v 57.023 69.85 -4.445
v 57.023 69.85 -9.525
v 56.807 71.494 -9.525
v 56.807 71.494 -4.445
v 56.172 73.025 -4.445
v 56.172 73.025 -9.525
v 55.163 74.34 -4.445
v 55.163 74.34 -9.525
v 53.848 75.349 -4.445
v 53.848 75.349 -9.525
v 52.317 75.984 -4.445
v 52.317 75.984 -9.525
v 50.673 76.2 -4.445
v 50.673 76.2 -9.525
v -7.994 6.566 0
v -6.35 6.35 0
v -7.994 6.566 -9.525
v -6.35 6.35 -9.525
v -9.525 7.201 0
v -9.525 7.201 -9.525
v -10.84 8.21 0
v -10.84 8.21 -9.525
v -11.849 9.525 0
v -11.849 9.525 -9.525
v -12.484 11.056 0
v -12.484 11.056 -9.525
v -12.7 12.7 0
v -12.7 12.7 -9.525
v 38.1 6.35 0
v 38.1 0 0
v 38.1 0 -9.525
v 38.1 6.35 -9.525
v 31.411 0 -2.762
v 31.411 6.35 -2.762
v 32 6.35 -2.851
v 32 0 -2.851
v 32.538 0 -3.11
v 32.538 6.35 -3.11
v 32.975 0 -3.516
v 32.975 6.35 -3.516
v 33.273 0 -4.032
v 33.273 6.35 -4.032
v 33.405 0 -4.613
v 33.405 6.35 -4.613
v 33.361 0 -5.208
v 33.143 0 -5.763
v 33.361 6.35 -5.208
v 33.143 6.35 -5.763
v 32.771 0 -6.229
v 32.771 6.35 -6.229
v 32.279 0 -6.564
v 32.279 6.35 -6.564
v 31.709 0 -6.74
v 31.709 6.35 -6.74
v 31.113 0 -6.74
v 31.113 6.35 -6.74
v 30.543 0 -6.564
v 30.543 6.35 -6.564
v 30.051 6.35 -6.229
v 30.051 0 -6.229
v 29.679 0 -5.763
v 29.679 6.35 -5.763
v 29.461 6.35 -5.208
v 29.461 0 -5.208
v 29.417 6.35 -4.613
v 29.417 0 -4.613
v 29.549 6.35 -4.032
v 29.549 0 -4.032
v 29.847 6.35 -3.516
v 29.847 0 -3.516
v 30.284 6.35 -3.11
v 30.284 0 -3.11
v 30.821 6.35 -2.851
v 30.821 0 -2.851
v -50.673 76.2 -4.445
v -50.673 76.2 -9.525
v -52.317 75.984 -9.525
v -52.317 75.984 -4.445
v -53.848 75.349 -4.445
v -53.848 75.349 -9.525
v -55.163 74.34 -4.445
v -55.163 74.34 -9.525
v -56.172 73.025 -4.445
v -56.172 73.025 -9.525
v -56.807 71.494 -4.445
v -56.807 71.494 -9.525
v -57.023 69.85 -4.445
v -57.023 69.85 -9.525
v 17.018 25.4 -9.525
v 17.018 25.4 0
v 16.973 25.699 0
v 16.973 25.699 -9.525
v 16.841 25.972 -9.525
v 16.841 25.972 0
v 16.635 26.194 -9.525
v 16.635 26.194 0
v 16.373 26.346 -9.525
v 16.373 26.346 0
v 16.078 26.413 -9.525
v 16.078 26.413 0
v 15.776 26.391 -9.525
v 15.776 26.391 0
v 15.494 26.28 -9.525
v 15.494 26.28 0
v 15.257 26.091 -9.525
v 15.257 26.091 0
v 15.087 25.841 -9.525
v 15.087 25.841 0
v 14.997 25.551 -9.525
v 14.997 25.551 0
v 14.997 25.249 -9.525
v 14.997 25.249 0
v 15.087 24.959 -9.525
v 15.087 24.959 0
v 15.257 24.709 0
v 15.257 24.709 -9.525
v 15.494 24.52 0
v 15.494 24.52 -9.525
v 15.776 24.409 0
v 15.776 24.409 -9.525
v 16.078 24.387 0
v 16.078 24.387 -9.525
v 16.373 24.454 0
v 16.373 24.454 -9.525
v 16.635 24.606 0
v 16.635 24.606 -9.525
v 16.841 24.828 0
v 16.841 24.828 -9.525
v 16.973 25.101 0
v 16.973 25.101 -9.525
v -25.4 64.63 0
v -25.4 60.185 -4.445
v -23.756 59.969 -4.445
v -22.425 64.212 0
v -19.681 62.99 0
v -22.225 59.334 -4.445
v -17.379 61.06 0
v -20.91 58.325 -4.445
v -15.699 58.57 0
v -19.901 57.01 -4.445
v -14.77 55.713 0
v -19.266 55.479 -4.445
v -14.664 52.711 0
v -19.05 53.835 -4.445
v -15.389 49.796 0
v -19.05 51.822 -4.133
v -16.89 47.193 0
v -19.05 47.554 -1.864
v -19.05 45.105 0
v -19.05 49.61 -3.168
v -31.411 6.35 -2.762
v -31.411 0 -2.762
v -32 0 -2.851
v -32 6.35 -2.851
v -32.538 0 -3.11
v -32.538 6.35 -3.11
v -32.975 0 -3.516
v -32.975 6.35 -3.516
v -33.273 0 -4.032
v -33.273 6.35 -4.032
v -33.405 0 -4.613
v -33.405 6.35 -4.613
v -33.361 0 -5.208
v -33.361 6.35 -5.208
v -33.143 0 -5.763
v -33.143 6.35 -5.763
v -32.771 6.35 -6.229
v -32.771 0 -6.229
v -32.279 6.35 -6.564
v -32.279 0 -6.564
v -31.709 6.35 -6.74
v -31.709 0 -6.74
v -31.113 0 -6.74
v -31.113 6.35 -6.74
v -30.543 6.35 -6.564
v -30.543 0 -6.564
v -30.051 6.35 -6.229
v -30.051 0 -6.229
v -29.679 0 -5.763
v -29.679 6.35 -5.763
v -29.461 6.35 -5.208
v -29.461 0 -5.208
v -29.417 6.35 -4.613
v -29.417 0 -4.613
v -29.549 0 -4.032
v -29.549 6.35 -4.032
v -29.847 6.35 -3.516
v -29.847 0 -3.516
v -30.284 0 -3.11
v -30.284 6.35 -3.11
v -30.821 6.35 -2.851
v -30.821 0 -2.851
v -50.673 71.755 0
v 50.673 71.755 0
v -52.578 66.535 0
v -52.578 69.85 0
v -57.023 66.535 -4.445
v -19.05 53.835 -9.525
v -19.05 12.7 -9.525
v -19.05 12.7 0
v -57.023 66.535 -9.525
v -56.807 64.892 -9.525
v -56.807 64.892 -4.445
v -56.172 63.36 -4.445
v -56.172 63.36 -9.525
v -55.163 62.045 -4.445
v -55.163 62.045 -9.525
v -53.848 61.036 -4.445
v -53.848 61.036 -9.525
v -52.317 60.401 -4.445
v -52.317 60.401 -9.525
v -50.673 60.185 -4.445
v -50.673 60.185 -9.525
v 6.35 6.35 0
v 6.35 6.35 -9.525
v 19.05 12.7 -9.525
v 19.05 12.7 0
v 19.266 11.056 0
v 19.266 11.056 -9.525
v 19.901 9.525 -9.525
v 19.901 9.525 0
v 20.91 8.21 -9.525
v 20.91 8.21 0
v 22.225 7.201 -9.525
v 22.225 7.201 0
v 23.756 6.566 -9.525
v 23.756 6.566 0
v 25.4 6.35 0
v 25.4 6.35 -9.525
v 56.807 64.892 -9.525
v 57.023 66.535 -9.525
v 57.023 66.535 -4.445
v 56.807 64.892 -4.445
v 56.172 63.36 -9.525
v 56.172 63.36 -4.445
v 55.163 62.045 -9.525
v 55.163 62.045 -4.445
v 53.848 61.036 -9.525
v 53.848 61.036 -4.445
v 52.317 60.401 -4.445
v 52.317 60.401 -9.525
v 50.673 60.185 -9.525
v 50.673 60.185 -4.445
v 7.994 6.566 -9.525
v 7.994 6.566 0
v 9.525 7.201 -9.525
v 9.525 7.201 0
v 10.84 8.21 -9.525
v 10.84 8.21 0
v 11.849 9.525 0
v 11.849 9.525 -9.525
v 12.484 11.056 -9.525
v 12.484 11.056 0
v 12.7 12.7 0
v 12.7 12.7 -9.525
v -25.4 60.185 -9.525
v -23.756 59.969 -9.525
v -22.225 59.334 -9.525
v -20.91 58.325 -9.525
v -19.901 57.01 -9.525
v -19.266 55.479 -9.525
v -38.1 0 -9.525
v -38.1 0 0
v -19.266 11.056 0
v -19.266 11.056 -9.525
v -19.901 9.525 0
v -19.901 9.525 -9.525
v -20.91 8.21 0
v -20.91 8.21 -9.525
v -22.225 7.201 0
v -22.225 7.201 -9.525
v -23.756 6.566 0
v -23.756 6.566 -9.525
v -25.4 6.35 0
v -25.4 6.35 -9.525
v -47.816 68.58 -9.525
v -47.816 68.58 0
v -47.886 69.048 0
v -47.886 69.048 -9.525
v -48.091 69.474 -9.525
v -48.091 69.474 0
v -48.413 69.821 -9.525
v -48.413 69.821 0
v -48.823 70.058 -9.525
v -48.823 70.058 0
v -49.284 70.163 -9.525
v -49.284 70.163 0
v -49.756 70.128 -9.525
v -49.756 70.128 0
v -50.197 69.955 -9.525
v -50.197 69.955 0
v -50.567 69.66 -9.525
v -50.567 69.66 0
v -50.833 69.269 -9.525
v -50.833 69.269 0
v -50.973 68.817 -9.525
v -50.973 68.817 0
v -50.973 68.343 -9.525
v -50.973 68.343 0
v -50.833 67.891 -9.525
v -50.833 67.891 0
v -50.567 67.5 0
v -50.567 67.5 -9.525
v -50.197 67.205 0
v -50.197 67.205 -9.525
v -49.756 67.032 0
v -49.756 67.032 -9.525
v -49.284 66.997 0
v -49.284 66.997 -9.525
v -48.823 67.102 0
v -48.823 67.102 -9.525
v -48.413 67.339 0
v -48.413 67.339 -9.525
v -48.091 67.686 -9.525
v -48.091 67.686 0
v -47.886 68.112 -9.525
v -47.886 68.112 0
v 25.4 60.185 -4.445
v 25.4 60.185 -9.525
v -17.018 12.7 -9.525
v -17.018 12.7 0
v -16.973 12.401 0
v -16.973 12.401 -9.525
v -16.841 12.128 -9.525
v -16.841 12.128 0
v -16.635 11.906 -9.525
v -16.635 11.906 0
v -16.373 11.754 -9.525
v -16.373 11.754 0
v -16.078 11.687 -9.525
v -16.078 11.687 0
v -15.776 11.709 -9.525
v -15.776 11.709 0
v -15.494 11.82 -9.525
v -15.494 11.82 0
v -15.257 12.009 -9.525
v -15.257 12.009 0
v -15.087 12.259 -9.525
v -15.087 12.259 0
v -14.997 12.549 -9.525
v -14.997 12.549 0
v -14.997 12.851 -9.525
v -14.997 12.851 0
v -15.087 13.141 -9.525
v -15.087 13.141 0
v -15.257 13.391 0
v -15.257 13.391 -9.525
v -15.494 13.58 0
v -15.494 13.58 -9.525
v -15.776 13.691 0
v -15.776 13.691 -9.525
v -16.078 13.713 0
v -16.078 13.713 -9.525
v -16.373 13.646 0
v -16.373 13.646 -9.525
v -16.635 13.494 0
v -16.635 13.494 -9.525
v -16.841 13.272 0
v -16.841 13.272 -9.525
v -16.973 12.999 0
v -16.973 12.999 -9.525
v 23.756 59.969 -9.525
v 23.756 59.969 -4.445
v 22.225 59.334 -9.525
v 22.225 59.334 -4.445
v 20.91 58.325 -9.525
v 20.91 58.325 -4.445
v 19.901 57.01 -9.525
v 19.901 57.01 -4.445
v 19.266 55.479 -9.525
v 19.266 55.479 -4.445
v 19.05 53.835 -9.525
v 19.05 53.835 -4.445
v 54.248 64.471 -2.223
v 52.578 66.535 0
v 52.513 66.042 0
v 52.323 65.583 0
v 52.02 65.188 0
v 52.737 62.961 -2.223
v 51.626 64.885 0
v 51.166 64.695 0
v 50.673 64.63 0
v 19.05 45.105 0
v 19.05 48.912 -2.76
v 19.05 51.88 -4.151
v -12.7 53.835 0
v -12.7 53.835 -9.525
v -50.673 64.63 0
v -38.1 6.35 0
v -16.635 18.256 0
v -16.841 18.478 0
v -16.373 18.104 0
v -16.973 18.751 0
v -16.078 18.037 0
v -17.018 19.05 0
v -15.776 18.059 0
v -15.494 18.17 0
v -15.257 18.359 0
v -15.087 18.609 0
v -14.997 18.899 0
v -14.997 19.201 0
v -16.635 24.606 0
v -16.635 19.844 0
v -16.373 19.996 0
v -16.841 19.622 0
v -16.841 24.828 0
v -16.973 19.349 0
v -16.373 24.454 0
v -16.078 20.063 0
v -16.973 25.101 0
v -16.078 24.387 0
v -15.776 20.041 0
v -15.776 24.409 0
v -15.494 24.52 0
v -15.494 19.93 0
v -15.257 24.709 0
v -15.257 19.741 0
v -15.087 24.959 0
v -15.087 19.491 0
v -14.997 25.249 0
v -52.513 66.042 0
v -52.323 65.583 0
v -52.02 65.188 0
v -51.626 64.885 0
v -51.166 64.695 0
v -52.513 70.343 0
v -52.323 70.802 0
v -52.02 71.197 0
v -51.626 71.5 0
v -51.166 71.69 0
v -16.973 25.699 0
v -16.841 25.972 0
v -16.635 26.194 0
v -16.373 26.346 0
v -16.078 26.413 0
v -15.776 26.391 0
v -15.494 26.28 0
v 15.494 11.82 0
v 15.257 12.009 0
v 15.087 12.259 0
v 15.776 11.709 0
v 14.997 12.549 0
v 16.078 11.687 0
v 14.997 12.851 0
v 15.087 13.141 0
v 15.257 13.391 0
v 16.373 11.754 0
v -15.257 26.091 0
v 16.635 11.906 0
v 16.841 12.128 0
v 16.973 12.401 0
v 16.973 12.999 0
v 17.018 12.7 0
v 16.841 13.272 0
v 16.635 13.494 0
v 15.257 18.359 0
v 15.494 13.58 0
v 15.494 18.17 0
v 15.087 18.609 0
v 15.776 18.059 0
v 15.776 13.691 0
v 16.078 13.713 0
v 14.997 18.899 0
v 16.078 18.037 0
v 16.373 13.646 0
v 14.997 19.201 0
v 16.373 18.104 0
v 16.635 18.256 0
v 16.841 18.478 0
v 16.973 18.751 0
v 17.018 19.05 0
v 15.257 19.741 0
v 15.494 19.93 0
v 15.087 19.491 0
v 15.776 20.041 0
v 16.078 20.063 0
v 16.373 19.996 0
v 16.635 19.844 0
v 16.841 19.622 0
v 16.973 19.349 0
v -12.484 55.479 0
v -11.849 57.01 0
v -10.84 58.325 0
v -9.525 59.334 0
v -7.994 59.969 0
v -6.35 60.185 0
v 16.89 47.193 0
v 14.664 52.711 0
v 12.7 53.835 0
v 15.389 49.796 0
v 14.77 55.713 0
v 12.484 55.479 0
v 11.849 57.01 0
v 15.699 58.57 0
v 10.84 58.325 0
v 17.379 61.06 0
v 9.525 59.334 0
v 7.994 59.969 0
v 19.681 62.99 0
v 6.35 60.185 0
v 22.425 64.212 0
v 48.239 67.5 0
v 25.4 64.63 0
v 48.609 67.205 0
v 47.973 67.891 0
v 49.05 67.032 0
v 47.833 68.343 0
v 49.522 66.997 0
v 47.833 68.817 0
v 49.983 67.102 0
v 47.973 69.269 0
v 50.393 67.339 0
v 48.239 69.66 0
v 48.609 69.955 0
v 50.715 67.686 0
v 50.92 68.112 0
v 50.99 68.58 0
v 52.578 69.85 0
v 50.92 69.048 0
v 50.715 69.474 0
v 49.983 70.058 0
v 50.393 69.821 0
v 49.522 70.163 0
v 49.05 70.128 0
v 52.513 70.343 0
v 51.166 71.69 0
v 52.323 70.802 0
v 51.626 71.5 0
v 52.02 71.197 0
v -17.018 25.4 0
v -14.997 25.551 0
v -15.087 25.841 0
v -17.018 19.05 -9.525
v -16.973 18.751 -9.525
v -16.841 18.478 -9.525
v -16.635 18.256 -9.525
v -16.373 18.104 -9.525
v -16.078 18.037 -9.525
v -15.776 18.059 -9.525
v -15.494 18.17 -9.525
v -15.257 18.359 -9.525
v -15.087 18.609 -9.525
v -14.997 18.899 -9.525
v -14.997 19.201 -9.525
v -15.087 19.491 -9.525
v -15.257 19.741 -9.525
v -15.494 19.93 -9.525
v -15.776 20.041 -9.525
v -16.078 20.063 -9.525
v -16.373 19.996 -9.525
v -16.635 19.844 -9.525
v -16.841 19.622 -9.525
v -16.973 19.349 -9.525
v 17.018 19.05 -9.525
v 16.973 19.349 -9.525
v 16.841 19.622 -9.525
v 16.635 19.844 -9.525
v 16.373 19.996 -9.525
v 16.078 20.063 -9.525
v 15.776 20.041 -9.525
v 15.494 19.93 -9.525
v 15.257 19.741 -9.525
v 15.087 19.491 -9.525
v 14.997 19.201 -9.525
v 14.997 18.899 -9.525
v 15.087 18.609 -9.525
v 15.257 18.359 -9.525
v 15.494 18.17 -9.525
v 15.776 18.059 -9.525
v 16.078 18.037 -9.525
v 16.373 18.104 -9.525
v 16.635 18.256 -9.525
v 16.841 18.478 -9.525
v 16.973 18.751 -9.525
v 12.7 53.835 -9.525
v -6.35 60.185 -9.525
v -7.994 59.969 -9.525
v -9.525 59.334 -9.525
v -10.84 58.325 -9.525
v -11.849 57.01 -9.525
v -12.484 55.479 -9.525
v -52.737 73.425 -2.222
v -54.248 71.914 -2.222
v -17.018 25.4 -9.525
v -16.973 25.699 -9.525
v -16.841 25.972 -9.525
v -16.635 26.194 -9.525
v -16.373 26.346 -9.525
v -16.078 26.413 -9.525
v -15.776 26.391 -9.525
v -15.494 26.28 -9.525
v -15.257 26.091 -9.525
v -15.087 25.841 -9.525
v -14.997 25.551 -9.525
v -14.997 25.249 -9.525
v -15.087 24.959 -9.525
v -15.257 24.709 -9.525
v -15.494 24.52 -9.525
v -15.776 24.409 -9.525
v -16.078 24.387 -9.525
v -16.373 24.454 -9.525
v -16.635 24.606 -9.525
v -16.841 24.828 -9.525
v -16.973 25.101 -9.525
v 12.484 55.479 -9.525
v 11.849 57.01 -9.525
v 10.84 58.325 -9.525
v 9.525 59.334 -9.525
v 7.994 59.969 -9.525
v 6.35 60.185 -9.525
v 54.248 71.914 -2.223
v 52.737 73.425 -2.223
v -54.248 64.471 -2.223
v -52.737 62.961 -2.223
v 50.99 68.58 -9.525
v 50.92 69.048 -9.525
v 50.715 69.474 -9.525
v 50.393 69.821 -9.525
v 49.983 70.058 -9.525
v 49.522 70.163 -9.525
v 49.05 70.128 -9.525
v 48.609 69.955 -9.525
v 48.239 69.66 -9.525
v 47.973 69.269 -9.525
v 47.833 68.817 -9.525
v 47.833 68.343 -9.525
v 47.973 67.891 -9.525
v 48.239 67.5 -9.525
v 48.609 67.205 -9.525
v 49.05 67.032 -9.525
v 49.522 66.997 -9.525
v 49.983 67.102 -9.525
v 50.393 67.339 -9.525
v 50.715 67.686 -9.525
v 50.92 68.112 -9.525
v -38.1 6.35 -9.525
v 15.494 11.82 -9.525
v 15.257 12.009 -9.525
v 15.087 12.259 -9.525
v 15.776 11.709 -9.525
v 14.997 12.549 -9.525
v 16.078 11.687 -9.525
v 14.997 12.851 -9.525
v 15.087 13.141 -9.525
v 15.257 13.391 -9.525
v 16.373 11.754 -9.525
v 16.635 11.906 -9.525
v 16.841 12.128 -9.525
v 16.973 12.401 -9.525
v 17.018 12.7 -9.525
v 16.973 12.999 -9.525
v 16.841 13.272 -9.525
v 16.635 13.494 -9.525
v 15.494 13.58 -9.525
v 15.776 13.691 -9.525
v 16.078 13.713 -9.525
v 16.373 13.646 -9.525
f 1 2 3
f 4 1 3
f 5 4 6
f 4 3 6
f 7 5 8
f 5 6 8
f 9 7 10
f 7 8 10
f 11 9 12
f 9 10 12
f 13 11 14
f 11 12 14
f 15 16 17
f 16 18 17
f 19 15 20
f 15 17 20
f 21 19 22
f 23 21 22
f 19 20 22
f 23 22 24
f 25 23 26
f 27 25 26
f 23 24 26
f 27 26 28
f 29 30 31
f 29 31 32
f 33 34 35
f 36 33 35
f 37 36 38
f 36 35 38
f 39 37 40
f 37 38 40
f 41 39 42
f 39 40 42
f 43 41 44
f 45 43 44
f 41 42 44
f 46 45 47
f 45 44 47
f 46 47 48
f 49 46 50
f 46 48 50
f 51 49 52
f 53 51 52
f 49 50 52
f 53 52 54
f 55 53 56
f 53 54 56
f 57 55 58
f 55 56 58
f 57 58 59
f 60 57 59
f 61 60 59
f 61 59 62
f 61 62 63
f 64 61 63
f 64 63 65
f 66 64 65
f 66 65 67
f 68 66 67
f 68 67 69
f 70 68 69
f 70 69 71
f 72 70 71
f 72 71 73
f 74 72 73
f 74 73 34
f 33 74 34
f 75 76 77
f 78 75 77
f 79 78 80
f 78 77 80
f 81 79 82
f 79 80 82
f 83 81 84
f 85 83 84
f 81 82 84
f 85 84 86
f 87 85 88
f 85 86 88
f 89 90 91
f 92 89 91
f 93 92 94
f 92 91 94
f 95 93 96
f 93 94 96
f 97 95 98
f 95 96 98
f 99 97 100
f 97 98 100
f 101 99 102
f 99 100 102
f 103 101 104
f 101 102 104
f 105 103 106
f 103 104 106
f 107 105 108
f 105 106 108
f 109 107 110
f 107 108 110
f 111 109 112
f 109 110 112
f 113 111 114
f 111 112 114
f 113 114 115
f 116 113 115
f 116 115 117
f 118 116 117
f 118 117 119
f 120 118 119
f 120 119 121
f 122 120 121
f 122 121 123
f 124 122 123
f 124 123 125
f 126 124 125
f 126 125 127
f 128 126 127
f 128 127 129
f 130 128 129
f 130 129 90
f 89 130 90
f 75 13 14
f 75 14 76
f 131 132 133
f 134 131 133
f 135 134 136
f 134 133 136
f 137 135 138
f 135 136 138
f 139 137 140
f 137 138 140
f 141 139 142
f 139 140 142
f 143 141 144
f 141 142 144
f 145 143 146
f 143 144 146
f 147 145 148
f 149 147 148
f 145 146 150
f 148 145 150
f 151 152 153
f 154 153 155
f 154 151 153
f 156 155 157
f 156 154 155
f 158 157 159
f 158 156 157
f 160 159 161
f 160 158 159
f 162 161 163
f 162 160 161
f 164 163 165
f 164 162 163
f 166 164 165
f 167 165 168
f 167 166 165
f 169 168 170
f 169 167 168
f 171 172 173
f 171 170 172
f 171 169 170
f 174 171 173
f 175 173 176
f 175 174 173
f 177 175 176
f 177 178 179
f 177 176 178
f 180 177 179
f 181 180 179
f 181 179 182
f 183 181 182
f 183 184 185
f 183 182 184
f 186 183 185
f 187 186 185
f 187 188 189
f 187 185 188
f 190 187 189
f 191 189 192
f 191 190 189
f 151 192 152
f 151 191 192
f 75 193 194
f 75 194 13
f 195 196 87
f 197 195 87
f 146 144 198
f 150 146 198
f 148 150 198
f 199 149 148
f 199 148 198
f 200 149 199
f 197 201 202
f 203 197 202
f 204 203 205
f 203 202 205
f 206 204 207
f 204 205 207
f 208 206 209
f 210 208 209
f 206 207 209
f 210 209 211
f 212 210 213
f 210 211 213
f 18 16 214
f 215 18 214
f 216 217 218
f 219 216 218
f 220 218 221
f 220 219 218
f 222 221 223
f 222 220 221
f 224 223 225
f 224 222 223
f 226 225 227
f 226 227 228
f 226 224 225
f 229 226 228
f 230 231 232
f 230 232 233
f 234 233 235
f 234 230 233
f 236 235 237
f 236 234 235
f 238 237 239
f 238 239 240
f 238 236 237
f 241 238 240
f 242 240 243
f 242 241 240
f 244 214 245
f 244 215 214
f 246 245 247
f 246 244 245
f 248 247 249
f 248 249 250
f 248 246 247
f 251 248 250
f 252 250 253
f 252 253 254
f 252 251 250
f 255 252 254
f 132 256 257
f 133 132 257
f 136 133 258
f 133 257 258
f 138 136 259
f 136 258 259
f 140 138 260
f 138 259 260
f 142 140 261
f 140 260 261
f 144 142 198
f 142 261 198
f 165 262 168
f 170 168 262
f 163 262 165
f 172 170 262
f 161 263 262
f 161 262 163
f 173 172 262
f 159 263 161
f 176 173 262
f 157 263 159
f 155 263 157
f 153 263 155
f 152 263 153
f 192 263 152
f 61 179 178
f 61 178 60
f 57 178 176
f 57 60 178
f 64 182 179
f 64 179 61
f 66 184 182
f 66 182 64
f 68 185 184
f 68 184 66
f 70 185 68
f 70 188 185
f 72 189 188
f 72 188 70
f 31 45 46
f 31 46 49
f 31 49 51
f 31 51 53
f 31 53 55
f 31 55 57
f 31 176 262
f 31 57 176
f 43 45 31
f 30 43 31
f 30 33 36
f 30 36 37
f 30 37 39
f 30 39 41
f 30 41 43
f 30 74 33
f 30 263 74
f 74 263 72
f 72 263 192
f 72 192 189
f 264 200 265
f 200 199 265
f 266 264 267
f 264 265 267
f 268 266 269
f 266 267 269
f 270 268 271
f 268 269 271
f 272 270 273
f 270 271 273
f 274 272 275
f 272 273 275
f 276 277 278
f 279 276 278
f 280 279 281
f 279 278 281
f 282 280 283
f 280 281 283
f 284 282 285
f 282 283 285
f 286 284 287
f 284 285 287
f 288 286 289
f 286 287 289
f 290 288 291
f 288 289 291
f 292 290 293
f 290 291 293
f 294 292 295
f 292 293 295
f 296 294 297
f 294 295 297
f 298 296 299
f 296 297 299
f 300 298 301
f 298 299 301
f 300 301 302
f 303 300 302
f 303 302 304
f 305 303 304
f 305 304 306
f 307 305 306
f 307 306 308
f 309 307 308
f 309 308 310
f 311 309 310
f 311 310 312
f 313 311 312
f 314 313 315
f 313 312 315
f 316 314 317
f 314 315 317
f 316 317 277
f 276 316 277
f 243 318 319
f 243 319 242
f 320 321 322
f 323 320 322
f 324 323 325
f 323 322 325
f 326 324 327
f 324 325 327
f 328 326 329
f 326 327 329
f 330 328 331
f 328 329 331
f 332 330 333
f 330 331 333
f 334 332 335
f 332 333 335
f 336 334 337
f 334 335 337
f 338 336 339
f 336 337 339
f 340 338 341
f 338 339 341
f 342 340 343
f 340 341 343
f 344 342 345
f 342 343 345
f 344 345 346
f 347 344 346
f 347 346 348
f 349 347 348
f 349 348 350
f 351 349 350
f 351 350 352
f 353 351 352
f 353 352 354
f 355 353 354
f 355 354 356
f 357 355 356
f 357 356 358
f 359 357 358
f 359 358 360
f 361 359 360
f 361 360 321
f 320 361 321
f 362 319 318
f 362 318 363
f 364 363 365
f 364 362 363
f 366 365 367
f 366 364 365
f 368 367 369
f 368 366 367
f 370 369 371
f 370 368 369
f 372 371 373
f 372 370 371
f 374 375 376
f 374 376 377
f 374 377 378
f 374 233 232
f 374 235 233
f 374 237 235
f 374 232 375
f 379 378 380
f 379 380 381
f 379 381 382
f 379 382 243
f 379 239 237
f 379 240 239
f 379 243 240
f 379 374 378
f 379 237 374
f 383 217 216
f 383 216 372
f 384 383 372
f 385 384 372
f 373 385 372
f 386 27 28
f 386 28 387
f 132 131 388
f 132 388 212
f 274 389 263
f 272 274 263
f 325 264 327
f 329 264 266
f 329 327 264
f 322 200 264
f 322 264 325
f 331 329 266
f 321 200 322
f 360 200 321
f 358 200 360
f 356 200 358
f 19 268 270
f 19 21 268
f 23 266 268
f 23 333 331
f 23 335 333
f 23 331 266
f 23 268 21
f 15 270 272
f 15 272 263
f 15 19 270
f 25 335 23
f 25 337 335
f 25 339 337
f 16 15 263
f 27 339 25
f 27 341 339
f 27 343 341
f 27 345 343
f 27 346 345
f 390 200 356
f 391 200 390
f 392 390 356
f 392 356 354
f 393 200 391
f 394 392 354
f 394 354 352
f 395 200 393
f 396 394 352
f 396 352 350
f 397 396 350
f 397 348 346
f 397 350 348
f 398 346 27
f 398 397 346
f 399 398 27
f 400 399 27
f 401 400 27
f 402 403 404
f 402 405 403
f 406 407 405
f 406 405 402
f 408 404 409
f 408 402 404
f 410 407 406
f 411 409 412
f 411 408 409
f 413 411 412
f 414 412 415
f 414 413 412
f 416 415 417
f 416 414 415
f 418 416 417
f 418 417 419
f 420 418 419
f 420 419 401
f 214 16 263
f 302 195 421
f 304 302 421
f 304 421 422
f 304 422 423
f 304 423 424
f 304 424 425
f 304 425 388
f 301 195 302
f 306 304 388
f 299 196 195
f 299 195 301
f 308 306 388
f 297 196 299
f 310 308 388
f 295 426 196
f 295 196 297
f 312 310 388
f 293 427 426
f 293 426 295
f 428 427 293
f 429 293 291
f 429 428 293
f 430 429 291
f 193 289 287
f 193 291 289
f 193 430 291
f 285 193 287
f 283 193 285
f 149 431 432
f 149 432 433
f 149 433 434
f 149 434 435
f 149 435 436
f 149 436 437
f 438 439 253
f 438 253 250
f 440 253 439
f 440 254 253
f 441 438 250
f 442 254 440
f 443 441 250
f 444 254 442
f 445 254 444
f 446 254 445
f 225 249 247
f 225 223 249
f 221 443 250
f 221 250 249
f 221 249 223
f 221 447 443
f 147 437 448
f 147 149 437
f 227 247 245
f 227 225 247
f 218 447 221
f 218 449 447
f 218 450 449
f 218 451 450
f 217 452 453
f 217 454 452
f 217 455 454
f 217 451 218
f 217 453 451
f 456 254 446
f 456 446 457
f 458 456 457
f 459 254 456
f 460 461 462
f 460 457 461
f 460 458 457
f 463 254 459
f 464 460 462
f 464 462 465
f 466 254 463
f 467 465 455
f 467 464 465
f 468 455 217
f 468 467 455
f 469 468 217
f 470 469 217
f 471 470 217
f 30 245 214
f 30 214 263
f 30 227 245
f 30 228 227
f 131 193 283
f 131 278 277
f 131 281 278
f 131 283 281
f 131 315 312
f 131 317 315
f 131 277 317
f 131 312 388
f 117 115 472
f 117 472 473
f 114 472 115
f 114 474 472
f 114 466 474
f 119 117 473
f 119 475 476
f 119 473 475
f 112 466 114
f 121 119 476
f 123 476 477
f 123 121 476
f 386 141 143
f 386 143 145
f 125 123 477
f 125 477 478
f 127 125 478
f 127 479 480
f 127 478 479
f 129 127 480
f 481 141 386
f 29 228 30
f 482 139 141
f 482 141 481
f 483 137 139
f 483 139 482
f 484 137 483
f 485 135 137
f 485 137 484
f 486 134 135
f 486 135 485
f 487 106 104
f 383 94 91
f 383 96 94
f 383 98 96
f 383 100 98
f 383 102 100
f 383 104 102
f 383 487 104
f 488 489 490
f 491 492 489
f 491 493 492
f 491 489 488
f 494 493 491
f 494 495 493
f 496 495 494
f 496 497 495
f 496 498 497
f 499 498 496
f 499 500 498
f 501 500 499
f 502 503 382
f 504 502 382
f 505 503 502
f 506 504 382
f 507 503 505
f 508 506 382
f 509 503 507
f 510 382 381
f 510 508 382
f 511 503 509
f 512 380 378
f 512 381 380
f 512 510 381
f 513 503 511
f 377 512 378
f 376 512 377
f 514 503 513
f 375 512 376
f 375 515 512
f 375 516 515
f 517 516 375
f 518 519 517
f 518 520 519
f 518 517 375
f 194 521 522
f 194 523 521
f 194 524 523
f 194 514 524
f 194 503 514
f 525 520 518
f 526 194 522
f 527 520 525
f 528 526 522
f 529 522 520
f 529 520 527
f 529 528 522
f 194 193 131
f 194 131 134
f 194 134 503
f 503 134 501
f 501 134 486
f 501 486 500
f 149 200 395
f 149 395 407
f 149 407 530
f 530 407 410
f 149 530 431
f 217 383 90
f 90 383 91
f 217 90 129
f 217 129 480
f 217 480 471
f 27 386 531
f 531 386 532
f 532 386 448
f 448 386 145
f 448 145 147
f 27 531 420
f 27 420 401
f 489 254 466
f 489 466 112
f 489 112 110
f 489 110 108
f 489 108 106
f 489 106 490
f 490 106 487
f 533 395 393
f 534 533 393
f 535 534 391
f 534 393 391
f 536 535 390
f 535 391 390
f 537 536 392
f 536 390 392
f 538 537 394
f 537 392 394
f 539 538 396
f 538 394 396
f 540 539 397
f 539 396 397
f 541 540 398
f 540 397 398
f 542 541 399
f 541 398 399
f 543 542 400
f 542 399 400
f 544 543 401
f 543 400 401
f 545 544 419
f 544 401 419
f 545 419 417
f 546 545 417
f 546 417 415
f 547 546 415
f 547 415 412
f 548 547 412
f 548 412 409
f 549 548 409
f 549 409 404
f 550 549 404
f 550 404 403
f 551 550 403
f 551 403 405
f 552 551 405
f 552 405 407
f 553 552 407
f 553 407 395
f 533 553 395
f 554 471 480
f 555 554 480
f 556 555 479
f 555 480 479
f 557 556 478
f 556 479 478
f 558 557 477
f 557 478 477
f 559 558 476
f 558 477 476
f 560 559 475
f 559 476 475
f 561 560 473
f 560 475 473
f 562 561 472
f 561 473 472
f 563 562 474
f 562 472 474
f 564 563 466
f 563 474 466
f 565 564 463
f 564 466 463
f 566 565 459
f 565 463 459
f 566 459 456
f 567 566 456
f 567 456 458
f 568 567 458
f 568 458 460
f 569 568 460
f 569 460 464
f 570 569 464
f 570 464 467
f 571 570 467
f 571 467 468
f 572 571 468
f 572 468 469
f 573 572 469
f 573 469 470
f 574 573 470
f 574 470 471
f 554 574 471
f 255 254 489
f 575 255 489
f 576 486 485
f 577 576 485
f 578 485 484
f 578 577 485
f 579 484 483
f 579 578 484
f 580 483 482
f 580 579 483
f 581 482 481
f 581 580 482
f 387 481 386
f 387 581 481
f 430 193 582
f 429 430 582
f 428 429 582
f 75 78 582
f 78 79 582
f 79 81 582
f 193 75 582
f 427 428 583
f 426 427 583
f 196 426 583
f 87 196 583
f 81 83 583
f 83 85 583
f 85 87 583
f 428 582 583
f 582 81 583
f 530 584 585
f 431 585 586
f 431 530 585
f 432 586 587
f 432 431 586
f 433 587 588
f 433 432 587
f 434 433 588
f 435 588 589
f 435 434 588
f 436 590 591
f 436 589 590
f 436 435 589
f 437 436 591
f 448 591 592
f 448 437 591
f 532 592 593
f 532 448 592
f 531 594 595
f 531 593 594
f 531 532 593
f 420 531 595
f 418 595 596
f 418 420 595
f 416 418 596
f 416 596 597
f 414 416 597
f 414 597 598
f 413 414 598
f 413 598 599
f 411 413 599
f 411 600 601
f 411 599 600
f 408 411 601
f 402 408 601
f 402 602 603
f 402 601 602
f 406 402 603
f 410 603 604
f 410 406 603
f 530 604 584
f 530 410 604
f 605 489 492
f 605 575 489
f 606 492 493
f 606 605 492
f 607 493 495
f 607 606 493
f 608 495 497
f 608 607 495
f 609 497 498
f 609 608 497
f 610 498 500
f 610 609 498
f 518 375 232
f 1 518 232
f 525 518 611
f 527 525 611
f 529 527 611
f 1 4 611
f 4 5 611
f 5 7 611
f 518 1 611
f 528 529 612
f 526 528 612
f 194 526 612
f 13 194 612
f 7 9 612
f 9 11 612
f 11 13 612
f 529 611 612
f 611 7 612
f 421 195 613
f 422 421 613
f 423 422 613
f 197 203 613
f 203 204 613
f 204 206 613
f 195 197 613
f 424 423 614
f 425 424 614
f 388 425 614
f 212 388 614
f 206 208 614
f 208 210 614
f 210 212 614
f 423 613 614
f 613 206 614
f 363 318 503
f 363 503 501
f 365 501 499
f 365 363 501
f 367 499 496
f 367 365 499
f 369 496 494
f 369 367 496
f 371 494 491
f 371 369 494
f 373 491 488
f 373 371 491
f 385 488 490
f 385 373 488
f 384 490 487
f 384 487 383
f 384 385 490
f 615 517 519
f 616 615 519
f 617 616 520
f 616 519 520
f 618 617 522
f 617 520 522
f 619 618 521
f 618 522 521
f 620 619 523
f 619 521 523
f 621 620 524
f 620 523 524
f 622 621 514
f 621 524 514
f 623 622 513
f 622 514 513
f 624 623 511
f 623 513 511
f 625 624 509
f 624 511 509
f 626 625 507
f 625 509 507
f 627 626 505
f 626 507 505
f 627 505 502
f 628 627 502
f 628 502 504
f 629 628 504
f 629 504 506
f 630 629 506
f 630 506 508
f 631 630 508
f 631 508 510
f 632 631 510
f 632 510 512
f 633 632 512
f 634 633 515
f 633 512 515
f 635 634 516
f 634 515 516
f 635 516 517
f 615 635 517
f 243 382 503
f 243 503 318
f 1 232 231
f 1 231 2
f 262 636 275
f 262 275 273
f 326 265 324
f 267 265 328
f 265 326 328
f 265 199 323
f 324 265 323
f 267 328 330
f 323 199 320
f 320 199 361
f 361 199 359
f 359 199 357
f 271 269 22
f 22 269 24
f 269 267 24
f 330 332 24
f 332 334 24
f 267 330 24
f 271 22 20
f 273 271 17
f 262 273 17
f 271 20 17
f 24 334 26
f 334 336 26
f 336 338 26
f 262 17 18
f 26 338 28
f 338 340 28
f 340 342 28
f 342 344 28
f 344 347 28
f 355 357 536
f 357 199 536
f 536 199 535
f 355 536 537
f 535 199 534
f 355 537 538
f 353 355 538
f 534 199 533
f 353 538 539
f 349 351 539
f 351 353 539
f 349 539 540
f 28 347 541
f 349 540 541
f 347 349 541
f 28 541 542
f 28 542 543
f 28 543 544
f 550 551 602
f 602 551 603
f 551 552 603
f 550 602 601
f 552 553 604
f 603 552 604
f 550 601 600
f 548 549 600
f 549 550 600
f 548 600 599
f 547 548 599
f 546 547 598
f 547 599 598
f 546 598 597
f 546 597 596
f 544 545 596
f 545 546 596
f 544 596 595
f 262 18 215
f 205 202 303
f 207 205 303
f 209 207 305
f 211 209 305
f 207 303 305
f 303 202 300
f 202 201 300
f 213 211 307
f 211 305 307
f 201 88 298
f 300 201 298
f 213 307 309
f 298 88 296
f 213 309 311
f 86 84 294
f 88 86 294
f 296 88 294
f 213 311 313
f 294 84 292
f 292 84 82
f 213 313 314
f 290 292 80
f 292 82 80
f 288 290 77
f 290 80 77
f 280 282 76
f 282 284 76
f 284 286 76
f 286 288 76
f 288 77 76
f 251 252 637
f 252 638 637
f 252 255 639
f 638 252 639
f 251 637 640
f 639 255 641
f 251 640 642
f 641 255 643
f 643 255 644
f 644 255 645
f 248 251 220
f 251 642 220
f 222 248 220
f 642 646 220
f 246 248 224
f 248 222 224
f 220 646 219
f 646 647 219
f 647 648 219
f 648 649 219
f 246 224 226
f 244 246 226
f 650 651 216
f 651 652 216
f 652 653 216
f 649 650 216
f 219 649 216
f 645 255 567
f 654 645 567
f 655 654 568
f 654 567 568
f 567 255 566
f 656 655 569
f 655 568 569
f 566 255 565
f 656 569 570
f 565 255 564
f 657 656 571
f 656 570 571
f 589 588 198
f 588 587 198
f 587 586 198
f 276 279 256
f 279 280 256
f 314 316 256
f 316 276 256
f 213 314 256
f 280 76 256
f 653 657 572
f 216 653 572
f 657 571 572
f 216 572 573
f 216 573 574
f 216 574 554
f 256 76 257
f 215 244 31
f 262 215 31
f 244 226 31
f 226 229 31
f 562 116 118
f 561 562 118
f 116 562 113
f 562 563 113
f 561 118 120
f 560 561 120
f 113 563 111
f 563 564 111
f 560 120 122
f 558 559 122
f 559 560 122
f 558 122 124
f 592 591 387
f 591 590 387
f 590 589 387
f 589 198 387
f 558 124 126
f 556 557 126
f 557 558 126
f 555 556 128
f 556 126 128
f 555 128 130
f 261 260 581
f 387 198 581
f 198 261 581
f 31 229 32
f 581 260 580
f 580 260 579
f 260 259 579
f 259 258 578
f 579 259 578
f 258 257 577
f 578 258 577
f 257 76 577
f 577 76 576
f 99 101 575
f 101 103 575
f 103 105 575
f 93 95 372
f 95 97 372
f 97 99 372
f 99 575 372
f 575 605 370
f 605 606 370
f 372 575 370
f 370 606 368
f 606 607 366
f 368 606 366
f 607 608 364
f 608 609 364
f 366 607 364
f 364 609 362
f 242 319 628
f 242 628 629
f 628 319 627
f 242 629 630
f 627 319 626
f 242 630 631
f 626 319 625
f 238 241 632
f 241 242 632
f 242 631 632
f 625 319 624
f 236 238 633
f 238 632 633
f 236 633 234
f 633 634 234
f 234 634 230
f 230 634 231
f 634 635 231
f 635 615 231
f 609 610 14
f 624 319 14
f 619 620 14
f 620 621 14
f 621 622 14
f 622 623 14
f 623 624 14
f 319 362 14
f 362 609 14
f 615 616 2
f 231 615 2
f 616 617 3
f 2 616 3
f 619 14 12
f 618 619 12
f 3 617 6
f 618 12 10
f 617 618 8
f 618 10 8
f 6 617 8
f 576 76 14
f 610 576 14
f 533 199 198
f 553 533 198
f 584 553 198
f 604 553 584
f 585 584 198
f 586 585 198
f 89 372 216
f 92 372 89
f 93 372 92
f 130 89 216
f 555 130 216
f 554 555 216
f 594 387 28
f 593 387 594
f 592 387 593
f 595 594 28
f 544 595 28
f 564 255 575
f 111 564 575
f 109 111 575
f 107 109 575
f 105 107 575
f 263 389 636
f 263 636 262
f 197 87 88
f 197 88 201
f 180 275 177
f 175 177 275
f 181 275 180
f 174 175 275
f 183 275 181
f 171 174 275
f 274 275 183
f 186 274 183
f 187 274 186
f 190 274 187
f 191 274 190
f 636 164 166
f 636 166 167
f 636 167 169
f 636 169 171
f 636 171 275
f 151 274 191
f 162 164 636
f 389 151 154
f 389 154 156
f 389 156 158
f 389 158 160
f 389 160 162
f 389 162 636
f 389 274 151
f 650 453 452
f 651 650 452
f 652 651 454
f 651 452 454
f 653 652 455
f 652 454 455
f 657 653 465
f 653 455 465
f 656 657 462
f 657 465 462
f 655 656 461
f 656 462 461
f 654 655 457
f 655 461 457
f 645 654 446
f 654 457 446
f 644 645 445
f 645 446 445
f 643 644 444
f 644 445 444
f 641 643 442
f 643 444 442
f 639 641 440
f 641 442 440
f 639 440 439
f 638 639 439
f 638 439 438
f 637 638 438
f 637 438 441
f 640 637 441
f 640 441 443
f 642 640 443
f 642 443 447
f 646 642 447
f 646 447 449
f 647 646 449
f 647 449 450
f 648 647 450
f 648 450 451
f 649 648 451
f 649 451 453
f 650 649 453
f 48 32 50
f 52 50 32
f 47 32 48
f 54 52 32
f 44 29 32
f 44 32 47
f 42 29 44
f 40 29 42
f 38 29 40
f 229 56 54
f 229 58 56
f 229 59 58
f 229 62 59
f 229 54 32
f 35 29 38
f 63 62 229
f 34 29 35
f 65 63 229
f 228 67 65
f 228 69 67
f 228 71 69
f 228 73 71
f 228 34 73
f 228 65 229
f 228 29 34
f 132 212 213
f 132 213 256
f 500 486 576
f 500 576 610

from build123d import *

# Parameters (mm, degrees)
SKETCH1_R                 = 1.5875
SKETCH1_W                 = 25.4
SKETCH1_H                 = 53.835078528
EXTRUDE1_DEPTH            = 9.525
FILLET1_R                 = 6.35
FILLET2_R                 = 6.35
CHAMFER3_SIZE             = 4.445
SKETCH2_R                 = 2.000000064
CUT_EXTRUDE1_DEPTH        = 91.671774296
SKETCH3_R                 = 1.016
CUT_EXTRUDE2_DEPTH        = 96.649297718
LPATTERN1_COUNT           = 3
LPATTERN1_PITCH           = 6.35
LPATTERN1_COPY_1_SKETCH_R = 1.016
LPATTERN1_COPY_1_DEPTH    = 96.649297718
LPATTERN1_COPY_2_SKETCH_R = 1.016
LPATTERN1_COPY_2_DEPTH    = 96.649297718


with BuildPart() as part:
    # Sketch1 → Extrude1 (new body)
    with BuildSketch(Plane.XY):
        Polygon((57.023, 60.185078528), (57.023, 76.2), (-57.023, 76.2), (-57.023, 60.185078528), (-19.05, 60.185078528), (-19.05, 6.35), (-38.1, 6.35), (-38.1, 0), (38.1, 0), (38.1, 6.35), (19.05, 6.35), (19.05, 60.185078528), align=None)
        with Locations((-49.403, 68.58)):
            Circle(SKETCH1_R, mode=Mode.SUBTRACT)
        with Locations((49.403, 68.58)):
            Circle(SKETCH1_R, mode=Mode.SUBTRACT)
        with Locations((0, 33.267539264)):
            Rectangle(SKETCH1_W, SKETCH1_H, mode=Mode.SUBTRACT)
    extrude(amount=-EXTRUDE1_DEPTH)

    # Fillet1
    fillet1_edges = [part.edges().sort_by_distance(p)[0] for p in [
        (-57.023, 60.185078528, -4.7625),
        (-57.023, 76.2, -4.7625),
        (57.023, 76.2, -4.7625),
        (57.023, 60.185078528, -4.7625),
    ]]
    fillet(fillet1_edges, radius=FILLET1_R)

    # Fillet2
    fillet2_edges = [part.edges().sort_by_distance(p)[0] for p in [
        (-19.05, 6.35, -4.7625),
        (-19.05, 60.185078528, -4.7625),
        (19.05, 60.185078528, -4.7625),
        (19.05, 6.35, -4.7625),
        (-12.7, 60.185078528, -4.7625),
        (12.7, 60.185078528, -4.7625),
        (12.7, 6.35, -4.7625),
        (-12.7, 6.35, -4.7625),
    ]]
    fillet(fillet2_edges, radius=FILLET2_R)

    # Chamfer3
    # the kernel refuses this chamfer: 4.445 mm, written as the material it takes off along each edge
    with BuildSketch(Plane(origin=(50.673, 76.2, 0), x_dir=(0, -0.9996219169112966, 0.02749587661058641), z_dir=(-1, 0, 0))) as chamfer3_piece_1:
        Polygon((CHAMFER3_SIZE * 0.999621916911, -CHAMFER3_SIZE * 0.0274958766106), (-CHAMFER3_SIZE * 0.0274958766106, -CHAMFER3_SIZE * 0.999621916911), (0, 0), align=None)
    extrude(amount=101.346, mode=Mode.SUBTRACT)
    with BuildSketch(Plane(origin=(57.023, 66.535078528, 0), x_dir=(-0.9996219169112966, 0, 0.027495876610586344), z_dir=(0, 1, 0)), Plane(origin=(-57.023, 69.85, 0), x_dir=(0.9996219169112966, 0, 0.027495876610586344), z_dir=(0, -1, 0))) as chamfer3_piece_2:
        Polygon((CHAMFER3_SIZE * 0.999621916911, -CHAMFER3_SIZE * 0.0274958766106), (-CHAMFER3_SIZE * 0.0274958766106, -CHAMFER3_SIZE * 0.999621916911), (0, 0), align=None)
    extrude(amount=3.314921472, mode=Mode.SUBTRACT)
    with BuildSketch(Plane(origin=(-50.673, 60.185078528, 0), x_dir=(0, 0.9996219169112966, 0.027495876610586344), z_dir=(1, 0, 0)), Plane(origin=(25.4, 60.185078528, 0), x_dir=(0, 0.9996219169112966, 0.02749587661058641), z_dir=(1, 0, 0))) as chamfer3_piece_3:
        Polygon((CHAMFER3_SIZE * 0.999621916911, -CHAMFER3_SIZE * 0.0274958766106), (-CHAMFER3_SIZE * 0.0274958766106, -CHAMFER3_SIZE * 0.999621916911), (0, 0), align=None)
    extrude(amount=25.273, mode=Mode.SUBTRACT)
    with BuildSketch(Plane(origin=(50.673, 66.535078528, 0), x_dir=(1, 0, 0), z_dir=(0, 1, 0))) as chamfer3_piece_4:
        Polygon((6.35 - CHAMFER3_SIZE, 0), (6.35, CHAMFER3_SIZE), (6.35, 0), align=None)
    revolve(axis=Axis((50.673, 66.535078528, 0), (0, 0, -1)), revolution_arc=90, mode=Mode.SUBTRACT)
    with BuildSketch(Plane(origin=(-50.673, 66.535078528, 0), x_dir=(-1, 0, 0), z_dir=(0, 1, 0))) as chamfer3_piece_5:
        Polygon((6.35 - CHAMFER3_SIZE, 0), (6.35, -CHAMFER3_SIZE), (6.35, 0), align=None)
    revolve(axis=Axis((-50.673, 66.535078528, 0), (0, 0, 1)), revolution_arc=90, mode=Mode.SUBTRACT)
    with BuildSketch(Plane(origin=(50.673, 69.85, 0), x_dir=(1, 0, 0), z_dir=(0, -1, 0))) as chamfer3_piece_6:
        Polygon((6.35 - CHAMFER3_SIZE, 0), (6.35, -CHAMFER3_SIZE), (6.35, 0), align=None)
    revolve(axis=Axis((50.673, 69.85, 0), (0, 0, 1)), revolution_arc=90, mode=Mode.SUBTRACT)
    with BuildSketch(Plane(origin=(-50.673, 69.85, 0), x_dir=(0, 1, 0), z_dir=(1, 0, 0))) as chamfer3_piece_7:
        Polygon((6.35 - CHAMFER3_SIZE, 0), (6.35, -CHAMFER3_SIZE), (6.35, 0), align=None)
    revolve(axis=Axis((-50.673, 69.85, 0), (0, 0, 1)), revolution_arc=90, mode=Mode.SUBTRACT)
    with BuildSketch(Plane(origin=(25.4, 53.835078528, 0), x_dir=(0, 1, 0), z_dir=(1, 0, 0))) as chamfer3_piece_8:
        Polygon((6.35 + CHAMFER3_SIZE, 0), (6.35, -CHAMFER3_SIZE), (6.35, 0), align=None)
    revolve(axis=Axis((25.4, 53.835078528, 0), (0, 0, 1)), revolution_arc=193.184040246, mode=Mode.SUBTRACT)
    with BuildSketch(Plane(origin=(-25.4, 53.835078528, 0), x_dir=(0, 1, 0), z_dir=(-1, 0, 0))) as chamfer3_piece_9:
        Polygon((6.35 + CHAMFER3_SIZE, 0), (6.35, CHAMFER3_SIZE), (6.35, 0), align=None)
    revolve(axis=Axis((-25.4, 53.835078528, 0), (0, 0, -1)), revolution_arc=193.184040246, mode=Mode.SUBTRACT)

    # Sketch2 → Cut-Extrude1 (cut, through all)
    with BuildSketch(Plane(origin=(0, 6.35, 0), x_dir=(1, 0, 0), z_dir=(0, 1, 0))):
        with Locations(Location((31.410975272, 4.7625, 0), (0, 0, 270))):
            Circle(SKETCH2_R)
    cut_extrude1 = extrude(amount=-CUT_EXTRUDE1_DEPTH, mode=Mode.SUBTRACT)

    # Mirror1: Cut-Extrude1 across plane
    add(cut_extrude1.mirror(Plane(origin=(0, 0, 0), x_dir=(0, 0, 1), z_dir=(1, 0, 0))), mode=Mode.SUBTRACT)

    # Sketch3 → Cut-Extrude2 (cut, through all)
    with BuildSketch(Plane.XY):
        with Locations((16.002, 25.4)):
            Circle(SKETCH3_R)
    cut_extrude2 = extrude(amount=-CUT_EXTRUDE2_DEPTH, mode=Mode.SUBTRACT)

    # Mirror2: Cut-Extrude2 across plane
    add(cut_extrude2.mirror(Plane(origin=(0, 0, 0), x_dir=(0, 0, 1), z_dir=(1, 0, 0))), mode=Mode.SUBTRACT)

    # LPattern1: Cut-Extrude2 ×3
    with Locations(*[(0, -i * LPATTERN1_PITCH, 0) for i in range(1, LPATTERN1_COUNT)]):
        add(cut_extrude2, mode=Mode.SUBTRACT)

    # LPattern1 copy 1 sketch → LPattern1 copy 1 (cut, through all)
    with BuildSketch(Plane(origin=(0, -6.35, 0), x_dir=(-1, 0, 0), z_dir=(0, 0, 1))):
        with Locations((16.002, -25.4)):
            Circle(LPATTERN1_COPY_1_SKETCH_R)
    extrude(amount=-LPATTERN1_COPY_1_DEPTH, mode=Mode.SUBTRACT)

    # LPattern1 copy 2 sketch → LPattern1 copy 2 (cut, through all)
    with BuildSketch(Plane(origin=(0, -12.7, 0), x_dir=(-1, 0, 0), z_dir=(0, 0, 1))):
        with Locations((16.002, -25.4)):
            Circle(LPATTERN1_COPY_2_SKETCH_R)
    extrude(amount=-LPATTERN1_COPY_2_DEPTH, mode=Mode.SUBTRACT)


solid = part.part
